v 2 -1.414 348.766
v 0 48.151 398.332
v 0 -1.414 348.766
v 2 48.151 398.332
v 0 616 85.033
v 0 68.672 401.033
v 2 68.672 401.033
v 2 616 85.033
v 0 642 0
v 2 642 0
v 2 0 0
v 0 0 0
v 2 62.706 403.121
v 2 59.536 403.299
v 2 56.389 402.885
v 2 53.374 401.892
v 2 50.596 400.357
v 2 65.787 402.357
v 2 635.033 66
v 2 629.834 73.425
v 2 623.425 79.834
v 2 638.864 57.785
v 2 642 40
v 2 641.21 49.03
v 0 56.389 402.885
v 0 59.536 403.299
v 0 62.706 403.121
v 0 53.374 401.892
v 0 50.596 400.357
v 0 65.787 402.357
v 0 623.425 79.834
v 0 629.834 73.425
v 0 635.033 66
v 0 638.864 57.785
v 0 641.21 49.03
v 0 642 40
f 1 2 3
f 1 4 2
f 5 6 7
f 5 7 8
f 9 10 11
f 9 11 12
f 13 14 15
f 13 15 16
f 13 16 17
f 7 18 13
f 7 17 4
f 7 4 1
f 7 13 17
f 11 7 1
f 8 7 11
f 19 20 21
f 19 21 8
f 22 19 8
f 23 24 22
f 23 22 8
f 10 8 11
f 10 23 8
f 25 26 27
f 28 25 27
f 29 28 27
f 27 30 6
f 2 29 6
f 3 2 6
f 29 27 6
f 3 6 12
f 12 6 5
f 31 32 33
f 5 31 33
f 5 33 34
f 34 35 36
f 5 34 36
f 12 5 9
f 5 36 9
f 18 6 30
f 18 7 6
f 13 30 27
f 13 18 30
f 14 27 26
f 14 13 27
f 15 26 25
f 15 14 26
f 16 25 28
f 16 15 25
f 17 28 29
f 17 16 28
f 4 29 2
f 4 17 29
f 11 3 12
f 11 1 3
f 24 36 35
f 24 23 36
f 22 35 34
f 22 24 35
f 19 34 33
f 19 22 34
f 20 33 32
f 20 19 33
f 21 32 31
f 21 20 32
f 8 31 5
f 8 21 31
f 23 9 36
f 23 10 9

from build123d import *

# Parameters (mm, degrees)
THICKEN1_T1 = 2


with BuildPart() as body_1:
    # Sketch1 → Surface-Plane1: a flat surface bounded by the sketch
    with BuildSketch(Plane(origin=(0, 0, 0), x_dir=(0, 0, -1), z_dir=(1, 0, 0)), mode=Mode.PRIVATE) as surface_plane1_1_region:
        with BuildLine():
            Line((0, 642), (-40, 642))
            ThreePointArc((-40, 642), (-66, 635.033320997), (-85.033320997, 616))
            Line((-85.033320997, 616), (-401.033320997, 68.671944808))
            ThreePointArc((-401.033320997, 68.671944808), (-403.165451776, 57.95299954), (-398.331704413, 48.151129528))
            Line((-398.331704413, 48.151129528), (-348.766361322, -1.414213562))
            Line((-348.766361322, -1.414213562), (0, 0))
            Line((0, 0), (0, 642))
        make_face()
    surface_plane1_1 = surface_plane1_1_region.sketch.faces()[0]
    add(Solid.thicken(surface_plane1_1, THICKEN1_T1))


solid = body_1.part
